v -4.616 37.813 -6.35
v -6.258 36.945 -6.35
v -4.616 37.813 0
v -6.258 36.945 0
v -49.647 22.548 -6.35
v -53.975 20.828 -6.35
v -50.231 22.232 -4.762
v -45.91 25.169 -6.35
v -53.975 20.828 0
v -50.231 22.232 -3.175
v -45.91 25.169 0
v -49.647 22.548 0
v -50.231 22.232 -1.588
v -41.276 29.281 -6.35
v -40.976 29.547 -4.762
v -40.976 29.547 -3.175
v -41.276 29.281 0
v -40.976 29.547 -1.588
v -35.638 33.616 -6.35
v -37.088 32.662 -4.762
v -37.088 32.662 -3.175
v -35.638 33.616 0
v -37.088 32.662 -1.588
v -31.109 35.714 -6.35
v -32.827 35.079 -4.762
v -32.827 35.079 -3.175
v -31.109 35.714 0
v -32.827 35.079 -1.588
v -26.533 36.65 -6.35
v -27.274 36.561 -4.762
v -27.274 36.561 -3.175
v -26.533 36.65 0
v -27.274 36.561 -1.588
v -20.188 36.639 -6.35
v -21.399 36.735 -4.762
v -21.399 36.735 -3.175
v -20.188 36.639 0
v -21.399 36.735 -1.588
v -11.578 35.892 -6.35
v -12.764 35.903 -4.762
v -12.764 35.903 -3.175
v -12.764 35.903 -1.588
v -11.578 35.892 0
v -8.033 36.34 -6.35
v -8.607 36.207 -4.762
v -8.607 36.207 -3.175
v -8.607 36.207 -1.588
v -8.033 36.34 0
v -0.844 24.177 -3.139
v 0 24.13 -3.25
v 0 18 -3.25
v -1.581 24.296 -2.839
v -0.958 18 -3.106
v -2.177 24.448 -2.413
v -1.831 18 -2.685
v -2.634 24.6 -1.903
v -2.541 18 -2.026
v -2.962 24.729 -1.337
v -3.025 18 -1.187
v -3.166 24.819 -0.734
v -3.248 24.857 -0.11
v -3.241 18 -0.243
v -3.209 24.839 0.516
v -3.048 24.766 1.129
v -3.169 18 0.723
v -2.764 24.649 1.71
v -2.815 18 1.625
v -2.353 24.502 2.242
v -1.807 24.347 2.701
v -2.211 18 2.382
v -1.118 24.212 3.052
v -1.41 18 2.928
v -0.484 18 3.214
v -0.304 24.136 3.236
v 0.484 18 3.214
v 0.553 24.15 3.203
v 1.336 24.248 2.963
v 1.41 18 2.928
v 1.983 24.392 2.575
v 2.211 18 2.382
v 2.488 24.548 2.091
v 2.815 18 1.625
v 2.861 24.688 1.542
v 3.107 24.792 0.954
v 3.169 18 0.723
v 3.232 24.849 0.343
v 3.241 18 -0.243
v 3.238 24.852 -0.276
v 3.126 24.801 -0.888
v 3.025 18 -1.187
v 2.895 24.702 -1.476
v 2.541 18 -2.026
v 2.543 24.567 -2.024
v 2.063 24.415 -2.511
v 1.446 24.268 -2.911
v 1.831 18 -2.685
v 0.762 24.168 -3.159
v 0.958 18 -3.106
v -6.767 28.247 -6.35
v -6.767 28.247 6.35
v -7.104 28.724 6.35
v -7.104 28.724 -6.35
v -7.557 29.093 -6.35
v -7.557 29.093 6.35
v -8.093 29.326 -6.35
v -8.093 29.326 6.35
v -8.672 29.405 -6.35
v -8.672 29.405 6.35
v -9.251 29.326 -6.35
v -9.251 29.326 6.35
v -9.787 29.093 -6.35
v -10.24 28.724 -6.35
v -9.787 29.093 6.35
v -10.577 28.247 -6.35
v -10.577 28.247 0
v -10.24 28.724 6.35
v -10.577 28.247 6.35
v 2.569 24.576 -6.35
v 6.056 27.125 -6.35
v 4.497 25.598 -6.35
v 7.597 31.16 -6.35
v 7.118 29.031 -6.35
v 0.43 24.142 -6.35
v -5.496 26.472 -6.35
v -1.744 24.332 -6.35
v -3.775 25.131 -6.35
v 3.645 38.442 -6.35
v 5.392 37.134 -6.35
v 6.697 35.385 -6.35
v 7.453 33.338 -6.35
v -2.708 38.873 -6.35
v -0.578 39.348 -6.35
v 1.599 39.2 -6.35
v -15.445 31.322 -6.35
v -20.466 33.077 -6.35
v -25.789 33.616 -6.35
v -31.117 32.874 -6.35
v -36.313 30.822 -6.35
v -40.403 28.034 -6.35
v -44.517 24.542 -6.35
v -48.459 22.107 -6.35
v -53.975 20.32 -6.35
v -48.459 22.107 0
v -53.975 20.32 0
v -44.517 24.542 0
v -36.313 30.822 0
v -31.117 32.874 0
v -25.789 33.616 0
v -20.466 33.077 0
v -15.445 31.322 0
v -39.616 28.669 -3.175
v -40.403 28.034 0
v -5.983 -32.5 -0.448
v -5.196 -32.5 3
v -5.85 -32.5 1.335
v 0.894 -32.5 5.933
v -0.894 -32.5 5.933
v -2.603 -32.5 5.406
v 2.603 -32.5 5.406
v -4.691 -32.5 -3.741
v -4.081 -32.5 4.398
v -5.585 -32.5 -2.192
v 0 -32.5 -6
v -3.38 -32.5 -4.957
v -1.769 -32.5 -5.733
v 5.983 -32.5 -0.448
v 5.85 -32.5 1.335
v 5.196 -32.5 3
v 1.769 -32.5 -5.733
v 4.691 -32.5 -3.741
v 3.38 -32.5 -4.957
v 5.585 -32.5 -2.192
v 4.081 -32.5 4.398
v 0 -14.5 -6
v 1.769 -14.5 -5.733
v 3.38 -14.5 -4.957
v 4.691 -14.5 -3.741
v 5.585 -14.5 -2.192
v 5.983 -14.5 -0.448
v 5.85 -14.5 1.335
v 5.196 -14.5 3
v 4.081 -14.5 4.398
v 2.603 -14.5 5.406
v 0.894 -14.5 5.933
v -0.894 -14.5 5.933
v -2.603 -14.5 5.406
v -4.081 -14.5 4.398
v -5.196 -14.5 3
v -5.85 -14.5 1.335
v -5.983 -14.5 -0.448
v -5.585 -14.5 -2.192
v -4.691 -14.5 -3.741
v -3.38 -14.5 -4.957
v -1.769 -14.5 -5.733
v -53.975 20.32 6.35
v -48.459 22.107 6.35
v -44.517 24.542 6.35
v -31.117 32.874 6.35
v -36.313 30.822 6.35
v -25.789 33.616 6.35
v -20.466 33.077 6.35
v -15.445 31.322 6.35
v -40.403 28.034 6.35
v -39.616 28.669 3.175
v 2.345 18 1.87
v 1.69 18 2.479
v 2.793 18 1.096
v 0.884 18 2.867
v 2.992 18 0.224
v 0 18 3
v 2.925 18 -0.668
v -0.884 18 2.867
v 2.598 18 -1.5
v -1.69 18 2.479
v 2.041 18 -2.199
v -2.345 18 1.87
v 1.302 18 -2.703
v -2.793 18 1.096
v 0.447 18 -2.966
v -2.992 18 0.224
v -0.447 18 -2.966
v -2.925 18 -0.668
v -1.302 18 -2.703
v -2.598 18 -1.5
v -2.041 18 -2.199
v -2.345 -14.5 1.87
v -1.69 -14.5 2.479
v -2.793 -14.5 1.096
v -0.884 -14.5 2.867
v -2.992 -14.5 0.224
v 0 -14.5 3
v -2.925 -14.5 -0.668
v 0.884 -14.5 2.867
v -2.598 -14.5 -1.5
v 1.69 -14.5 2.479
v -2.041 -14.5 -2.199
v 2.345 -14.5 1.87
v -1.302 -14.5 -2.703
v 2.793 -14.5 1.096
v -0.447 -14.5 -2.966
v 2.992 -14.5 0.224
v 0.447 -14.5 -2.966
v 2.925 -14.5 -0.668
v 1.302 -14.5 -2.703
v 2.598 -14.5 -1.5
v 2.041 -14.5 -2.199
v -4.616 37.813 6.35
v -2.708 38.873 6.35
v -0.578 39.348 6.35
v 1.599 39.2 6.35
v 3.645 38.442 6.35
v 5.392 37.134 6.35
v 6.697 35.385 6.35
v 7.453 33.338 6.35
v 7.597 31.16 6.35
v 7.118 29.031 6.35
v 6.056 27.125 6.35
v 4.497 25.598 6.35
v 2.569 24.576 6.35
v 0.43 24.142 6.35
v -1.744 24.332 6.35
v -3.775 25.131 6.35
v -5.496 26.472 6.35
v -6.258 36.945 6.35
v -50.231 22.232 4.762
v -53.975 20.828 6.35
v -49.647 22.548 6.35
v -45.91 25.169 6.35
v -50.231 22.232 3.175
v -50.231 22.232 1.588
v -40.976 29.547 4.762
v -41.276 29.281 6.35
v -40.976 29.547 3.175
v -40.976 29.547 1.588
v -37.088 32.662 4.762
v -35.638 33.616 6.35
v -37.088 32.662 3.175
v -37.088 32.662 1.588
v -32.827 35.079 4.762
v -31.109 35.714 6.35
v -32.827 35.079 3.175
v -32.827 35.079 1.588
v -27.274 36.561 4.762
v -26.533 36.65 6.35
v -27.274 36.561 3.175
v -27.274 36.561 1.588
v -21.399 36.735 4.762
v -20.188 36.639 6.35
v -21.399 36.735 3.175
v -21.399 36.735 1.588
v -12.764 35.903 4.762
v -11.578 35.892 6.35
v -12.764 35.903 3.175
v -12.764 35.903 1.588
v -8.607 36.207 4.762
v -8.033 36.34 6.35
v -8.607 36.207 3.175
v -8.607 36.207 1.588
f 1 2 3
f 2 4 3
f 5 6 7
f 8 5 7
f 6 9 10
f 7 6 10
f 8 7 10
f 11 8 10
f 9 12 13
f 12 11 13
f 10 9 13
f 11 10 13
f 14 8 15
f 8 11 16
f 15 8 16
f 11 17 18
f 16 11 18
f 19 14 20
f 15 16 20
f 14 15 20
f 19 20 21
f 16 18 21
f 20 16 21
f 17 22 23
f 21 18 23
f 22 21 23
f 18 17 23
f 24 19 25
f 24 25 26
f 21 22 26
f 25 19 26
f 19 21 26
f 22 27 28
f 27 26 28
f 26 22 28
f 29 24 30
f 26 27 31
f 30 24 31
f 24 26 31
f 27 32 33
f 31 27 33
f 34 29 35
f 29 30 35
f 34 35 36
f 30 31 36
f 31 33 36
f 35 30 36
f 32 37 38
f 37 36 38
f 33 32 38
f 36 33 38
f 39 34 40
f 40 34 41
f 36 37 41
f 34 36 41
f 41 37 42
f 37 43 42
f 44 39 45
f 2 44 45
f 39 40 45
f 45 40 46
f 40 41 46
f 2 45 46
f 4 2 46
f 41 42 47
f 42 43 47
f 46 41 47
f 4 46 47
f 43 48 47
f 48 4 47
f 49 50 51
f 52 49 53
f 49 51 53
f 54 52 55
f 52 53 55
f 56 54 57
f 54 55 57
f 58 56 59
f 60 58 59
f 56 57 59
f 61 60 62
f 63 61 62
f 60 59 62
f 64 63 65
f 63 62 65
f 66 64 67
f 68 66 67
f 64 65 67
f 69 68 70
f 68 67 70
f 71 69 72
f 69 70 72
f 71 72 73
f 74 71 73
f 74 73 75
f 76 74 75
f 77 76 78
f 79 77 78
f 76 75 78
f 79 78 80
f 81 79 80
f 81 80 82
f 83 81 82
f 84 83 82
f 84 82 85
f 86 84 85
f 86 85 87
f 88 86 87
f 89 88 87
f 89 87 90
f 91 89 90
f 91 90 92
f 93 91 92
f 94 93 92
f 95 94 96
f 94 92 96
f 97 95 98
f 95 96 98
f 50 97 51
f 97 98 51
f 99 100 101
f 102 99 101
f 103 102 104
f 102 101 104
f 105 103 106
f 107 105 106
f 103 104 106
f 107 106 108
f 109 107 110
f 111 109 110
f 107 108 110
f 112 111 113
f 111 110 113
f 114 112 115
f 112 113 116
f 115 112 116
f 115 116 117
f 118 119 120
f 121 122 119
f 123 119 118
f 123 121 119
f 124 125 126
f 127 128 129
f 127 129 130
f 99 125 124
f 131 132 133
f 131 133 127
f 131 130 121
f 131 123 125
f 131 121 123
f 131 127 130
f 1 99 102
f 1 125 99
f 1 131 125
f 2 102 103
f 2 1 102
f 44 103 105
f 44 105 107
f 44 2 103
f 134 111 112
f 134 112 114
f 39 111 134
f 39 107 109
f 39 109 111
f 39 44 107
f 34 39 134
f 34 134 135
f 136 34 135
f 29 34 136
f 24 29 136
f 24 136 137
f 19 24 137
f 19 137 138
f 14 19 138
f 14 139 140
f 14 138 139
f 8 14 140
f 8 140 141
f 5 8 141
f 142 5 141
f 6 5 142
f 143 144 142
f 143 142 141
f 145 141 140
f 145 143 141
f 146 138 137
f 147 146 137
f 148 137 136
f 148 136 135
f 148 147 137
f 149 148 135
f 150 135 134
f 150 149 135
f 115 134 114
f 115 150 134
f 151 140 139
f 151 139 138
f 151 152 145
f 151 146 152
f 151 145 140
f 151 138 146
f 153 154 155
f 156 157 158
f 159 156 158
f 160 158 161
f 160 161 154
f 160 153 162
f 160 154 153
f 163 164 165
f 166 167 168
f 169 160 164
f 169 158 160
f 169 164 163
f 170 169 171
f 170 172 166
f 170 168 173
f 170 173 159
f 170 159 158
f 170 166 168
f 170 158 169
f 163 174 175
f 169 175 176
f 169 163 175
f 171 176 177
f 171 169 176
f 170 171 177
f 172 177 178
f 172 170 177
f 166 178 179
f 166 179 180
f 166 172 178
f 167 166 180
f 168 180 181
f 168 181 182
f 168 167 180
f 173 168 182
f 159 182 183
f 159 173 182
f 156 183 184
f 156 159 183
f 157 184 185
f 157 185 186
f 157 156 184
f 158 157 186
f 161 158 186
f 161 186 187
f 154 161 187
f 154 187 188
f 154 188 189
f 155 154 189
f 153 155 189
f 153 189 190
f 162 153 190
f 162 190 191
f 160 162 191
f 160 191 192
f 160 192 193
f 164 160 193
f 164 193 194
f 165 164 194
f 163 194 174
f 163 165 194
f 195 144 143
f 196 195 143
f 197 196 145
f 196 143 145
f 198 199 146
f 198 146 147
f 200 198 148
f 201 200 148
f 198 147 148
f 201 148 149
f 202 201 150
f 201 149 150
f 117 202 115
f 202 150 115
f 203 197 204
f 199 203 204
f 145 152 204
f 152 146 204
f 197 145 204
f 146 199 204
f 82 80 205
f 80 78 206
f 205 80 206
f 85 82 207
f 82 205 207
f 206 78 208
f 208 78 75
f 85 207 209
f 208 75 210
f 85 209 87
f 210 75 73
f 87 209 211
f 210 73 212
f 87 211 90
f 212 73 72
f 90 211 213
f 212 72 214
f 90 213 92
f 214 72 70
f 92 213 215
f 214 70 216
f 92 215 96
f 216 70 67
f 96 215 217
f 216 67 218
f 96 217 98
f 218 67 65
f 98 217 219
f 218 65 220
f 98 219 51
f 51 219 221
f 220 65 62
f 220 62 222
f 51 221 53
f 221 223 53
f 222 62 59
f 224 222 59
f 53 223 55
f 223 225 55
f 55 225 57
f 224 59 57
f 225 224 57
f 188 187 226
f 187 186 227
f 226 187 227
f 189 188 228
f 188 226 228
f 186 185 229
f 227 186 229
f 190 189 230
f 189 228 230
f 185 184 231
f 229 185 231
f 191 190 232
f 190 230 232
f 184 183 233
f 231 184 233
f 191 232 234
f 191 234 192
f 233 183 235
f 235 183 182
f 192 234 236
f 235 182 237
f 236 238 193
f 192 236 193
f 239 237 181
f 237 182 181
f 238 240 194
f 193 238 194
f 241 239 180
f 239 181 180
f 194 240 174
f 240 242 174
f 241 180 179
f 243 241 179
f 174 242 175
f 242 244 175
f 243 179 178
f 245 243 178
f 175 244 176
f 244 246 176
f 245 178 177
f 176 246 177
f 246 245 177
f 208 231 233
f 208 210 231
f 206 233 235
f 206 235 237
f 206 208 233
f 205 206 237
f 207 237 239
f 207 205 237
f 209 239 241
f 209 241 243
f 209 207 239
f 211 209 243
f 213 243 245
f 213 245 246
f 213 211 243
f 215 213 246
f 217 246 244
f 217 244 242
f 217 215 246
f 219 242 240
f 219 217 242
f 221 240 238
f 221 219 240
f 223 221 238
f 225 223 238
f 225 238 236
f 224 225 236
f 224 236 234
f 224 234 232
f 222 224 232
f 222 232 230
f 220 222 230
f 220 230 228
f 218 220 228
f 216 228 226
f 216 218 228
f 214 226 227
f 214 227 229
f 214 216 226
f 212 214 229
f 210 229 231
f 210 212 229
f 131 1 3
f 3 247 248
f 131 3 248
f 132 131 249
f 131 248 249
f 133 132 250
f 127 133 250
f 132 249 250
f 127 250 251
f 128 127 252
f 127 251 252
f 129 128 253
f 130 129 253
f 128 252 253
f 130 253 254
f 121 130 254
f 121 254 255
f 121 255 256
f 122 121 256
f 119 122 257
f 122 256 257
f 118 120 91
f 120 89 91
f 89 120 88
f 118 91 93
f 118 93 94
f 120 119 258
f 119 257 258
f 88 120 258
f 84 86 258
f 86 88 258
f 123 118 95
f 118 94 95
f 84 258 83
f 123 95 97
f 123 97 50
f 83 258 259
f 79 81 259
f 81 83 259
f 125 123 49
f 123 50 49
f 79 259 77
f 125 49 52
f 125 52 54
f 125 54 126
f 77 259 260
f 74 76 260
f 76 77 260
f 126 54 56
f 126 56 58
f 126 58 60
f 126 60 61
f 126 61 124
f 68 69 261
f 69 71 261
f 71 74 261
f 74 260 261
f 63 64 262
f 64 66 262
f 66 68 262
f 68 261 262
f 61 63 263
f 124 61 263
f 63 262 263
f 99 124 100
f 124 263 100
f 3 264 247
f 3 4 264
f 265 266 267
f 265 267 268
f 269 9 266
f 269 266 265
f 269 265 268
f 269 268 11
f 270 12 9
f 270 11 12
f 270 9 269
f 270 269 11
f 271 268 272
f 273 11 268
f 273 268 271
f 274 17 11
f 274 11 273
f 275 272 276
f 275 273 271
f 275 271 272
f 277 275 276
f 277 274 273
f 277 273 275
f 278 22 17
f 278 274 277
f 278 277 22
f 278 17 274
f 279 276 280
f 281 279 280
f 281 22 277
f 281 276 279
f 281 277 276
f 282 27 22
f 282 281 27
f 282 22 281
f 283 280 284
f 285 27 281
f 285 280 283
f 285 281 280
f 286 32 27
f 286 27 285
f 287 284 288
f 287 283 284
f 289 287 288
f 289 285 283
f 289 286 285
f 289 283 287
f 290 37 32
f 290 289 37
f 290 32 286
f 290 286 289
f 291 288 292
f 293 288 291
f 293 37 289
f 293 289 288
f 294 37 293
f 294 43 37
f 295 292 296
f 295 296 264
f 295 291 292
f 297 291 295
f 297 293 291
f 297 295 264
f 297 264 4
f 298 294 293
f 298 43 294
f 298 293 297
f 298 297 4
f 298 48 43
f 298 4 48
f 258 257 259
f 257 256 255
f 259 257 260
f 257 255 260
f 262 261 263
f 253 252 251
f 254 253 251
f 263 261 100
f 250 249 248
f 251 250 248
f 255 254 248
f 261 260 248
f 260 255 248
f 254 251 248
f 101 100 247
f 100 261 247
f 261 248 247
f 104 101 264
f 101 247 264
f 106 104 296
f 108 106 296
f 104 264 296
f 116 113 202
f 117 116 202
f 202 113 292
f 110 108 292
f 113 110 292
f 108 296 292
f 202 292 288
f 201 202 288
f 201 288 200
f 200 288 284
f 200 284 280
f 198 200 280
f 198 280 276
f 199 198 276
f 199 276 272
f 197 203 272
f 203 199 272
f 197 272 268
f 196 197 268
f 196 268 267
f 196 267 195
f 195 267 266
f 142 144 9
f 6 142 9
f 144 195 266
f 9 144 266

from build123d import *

# Parameters (mm, degrees)
SKETCH1_R                = 3
BOSS_EXTRUDE1_DEPTH      = 32.5
BOSS_EXTRUDE2_DEPTH      = 6.35
BOSS_EXTRUDE3_REACH      = 87.109
BOSS_EXTRUDE3_END_RADIUS = 7.62
BOSS_EXTRUDE3_START      = 18
SKETCH3_R                = 3.25
SKETCH4_R                = 6
BOSS_EXTRUDE4_DEPTH      = 18


with BuildPart() as part:
    # Sketch1 → Boss-Extrude1 (new, symmetric)
    with BuildSketch(Plane(origin=(0, 0, 0), x_dir=(1, 0, 0), z_dir=(0, 1, 0))):
        with Locations(Location((0, 0, 0), (0, 0, 270))):
            Circle(SKETCH1_R)
    extrude(amount=BOSS_EXTRUDE1_DEPTH, both=True)

    # Sketch2 → Boss-Extrude2 (add, symmetric)
    with BuildSketch(Plane.XY):
        with BuildLine():
            Line((-53.975, 20.32), (-53.975, 20.828))
            add(Edge.make_bspline(
                [(-53.975, 20.828), (-48.579084473, 22.104261863), (-42.739180184, 28.451304863), (-32.707581635, 36.217235943), (-19.445903171, 37.601432098), (-9.805142387, 34.528428283), (-4.615884318, 37.812838606)],
                knots=[0, 0, 0, 0, 0.290913355, 0.472280192, 0.684923774, 1, 1, 1, 1], degree=3))
            ThreePointArc((-4.615884318, 37.812838606), (7.434387163, 30.07838775), (-6.766850807, 28.24655453))
            ThreePointArc((-6.766850807, 28.24655453), (-8.671850807, 29.405444626), (-10.576850807, 28.24655453))
            add(Edge.make_bspline(
                [(-53.975, 20.32), (-46.121670197, 21.895048491), (-37.272795223, 34.142014089), (-20.262703733, 35.94817115), (-10.576850807, 28.24655453)],
                knots=[0, 0, 0, 0, 0.320306102, 1, 1, 1, 1], degree=3))
        make_face()
    extrude(amount=BOSS_EXTRUDE2_DEPTH, both=True)

    # Boss-Extrude3: up to this cylinder (the profile starts outside it)
    boss_extrude3_end = Plane(origin=(0, 31.75, 0), z_dir=(0, 0, -1)) * Cylinder(BOSS_EXTRUDE3_END_RADIUS, 190.458, mode=Mode.PRIVATE)
    # Sketch3 → Boss-Extrude3 (add, up to the surface)
    with BuildSketch(Plane(origin=(0, 0, 0), x_dir=(1, 0, 0), z_dir=(0, 1, 0)).offset(BOSS_EXTRUDE3_START), mode=Mode.PRIVATE) as boss_extrude3_sk1:
        with Locations(Location((0, 0, 0), (0, 0, 90))):
            Circle(SKETCH3_R)
    boss_extrude3_tool1 = extrude(boss_extrude3_sk1.sketch, amount=BOSS_EXTRUDE3_REACH, mode=Mode.PRIVATE) - boss_extrude3_end
    add(boss_extrude3_tool1.solids().sort_by_distance((0, 18, 0))[0])

    # Sketch4 → Boss-Extrude4 (add)
    with BuildSketch(Plane.XZ.offset(32.5)):
        with Locations(Location((0, 0, 0), (0, 0, 270))):
            Circle(SKETCH4_R)
    extrude(amount=-BOSS_EXTRUDE4_DEPTH)


solid = part.part
